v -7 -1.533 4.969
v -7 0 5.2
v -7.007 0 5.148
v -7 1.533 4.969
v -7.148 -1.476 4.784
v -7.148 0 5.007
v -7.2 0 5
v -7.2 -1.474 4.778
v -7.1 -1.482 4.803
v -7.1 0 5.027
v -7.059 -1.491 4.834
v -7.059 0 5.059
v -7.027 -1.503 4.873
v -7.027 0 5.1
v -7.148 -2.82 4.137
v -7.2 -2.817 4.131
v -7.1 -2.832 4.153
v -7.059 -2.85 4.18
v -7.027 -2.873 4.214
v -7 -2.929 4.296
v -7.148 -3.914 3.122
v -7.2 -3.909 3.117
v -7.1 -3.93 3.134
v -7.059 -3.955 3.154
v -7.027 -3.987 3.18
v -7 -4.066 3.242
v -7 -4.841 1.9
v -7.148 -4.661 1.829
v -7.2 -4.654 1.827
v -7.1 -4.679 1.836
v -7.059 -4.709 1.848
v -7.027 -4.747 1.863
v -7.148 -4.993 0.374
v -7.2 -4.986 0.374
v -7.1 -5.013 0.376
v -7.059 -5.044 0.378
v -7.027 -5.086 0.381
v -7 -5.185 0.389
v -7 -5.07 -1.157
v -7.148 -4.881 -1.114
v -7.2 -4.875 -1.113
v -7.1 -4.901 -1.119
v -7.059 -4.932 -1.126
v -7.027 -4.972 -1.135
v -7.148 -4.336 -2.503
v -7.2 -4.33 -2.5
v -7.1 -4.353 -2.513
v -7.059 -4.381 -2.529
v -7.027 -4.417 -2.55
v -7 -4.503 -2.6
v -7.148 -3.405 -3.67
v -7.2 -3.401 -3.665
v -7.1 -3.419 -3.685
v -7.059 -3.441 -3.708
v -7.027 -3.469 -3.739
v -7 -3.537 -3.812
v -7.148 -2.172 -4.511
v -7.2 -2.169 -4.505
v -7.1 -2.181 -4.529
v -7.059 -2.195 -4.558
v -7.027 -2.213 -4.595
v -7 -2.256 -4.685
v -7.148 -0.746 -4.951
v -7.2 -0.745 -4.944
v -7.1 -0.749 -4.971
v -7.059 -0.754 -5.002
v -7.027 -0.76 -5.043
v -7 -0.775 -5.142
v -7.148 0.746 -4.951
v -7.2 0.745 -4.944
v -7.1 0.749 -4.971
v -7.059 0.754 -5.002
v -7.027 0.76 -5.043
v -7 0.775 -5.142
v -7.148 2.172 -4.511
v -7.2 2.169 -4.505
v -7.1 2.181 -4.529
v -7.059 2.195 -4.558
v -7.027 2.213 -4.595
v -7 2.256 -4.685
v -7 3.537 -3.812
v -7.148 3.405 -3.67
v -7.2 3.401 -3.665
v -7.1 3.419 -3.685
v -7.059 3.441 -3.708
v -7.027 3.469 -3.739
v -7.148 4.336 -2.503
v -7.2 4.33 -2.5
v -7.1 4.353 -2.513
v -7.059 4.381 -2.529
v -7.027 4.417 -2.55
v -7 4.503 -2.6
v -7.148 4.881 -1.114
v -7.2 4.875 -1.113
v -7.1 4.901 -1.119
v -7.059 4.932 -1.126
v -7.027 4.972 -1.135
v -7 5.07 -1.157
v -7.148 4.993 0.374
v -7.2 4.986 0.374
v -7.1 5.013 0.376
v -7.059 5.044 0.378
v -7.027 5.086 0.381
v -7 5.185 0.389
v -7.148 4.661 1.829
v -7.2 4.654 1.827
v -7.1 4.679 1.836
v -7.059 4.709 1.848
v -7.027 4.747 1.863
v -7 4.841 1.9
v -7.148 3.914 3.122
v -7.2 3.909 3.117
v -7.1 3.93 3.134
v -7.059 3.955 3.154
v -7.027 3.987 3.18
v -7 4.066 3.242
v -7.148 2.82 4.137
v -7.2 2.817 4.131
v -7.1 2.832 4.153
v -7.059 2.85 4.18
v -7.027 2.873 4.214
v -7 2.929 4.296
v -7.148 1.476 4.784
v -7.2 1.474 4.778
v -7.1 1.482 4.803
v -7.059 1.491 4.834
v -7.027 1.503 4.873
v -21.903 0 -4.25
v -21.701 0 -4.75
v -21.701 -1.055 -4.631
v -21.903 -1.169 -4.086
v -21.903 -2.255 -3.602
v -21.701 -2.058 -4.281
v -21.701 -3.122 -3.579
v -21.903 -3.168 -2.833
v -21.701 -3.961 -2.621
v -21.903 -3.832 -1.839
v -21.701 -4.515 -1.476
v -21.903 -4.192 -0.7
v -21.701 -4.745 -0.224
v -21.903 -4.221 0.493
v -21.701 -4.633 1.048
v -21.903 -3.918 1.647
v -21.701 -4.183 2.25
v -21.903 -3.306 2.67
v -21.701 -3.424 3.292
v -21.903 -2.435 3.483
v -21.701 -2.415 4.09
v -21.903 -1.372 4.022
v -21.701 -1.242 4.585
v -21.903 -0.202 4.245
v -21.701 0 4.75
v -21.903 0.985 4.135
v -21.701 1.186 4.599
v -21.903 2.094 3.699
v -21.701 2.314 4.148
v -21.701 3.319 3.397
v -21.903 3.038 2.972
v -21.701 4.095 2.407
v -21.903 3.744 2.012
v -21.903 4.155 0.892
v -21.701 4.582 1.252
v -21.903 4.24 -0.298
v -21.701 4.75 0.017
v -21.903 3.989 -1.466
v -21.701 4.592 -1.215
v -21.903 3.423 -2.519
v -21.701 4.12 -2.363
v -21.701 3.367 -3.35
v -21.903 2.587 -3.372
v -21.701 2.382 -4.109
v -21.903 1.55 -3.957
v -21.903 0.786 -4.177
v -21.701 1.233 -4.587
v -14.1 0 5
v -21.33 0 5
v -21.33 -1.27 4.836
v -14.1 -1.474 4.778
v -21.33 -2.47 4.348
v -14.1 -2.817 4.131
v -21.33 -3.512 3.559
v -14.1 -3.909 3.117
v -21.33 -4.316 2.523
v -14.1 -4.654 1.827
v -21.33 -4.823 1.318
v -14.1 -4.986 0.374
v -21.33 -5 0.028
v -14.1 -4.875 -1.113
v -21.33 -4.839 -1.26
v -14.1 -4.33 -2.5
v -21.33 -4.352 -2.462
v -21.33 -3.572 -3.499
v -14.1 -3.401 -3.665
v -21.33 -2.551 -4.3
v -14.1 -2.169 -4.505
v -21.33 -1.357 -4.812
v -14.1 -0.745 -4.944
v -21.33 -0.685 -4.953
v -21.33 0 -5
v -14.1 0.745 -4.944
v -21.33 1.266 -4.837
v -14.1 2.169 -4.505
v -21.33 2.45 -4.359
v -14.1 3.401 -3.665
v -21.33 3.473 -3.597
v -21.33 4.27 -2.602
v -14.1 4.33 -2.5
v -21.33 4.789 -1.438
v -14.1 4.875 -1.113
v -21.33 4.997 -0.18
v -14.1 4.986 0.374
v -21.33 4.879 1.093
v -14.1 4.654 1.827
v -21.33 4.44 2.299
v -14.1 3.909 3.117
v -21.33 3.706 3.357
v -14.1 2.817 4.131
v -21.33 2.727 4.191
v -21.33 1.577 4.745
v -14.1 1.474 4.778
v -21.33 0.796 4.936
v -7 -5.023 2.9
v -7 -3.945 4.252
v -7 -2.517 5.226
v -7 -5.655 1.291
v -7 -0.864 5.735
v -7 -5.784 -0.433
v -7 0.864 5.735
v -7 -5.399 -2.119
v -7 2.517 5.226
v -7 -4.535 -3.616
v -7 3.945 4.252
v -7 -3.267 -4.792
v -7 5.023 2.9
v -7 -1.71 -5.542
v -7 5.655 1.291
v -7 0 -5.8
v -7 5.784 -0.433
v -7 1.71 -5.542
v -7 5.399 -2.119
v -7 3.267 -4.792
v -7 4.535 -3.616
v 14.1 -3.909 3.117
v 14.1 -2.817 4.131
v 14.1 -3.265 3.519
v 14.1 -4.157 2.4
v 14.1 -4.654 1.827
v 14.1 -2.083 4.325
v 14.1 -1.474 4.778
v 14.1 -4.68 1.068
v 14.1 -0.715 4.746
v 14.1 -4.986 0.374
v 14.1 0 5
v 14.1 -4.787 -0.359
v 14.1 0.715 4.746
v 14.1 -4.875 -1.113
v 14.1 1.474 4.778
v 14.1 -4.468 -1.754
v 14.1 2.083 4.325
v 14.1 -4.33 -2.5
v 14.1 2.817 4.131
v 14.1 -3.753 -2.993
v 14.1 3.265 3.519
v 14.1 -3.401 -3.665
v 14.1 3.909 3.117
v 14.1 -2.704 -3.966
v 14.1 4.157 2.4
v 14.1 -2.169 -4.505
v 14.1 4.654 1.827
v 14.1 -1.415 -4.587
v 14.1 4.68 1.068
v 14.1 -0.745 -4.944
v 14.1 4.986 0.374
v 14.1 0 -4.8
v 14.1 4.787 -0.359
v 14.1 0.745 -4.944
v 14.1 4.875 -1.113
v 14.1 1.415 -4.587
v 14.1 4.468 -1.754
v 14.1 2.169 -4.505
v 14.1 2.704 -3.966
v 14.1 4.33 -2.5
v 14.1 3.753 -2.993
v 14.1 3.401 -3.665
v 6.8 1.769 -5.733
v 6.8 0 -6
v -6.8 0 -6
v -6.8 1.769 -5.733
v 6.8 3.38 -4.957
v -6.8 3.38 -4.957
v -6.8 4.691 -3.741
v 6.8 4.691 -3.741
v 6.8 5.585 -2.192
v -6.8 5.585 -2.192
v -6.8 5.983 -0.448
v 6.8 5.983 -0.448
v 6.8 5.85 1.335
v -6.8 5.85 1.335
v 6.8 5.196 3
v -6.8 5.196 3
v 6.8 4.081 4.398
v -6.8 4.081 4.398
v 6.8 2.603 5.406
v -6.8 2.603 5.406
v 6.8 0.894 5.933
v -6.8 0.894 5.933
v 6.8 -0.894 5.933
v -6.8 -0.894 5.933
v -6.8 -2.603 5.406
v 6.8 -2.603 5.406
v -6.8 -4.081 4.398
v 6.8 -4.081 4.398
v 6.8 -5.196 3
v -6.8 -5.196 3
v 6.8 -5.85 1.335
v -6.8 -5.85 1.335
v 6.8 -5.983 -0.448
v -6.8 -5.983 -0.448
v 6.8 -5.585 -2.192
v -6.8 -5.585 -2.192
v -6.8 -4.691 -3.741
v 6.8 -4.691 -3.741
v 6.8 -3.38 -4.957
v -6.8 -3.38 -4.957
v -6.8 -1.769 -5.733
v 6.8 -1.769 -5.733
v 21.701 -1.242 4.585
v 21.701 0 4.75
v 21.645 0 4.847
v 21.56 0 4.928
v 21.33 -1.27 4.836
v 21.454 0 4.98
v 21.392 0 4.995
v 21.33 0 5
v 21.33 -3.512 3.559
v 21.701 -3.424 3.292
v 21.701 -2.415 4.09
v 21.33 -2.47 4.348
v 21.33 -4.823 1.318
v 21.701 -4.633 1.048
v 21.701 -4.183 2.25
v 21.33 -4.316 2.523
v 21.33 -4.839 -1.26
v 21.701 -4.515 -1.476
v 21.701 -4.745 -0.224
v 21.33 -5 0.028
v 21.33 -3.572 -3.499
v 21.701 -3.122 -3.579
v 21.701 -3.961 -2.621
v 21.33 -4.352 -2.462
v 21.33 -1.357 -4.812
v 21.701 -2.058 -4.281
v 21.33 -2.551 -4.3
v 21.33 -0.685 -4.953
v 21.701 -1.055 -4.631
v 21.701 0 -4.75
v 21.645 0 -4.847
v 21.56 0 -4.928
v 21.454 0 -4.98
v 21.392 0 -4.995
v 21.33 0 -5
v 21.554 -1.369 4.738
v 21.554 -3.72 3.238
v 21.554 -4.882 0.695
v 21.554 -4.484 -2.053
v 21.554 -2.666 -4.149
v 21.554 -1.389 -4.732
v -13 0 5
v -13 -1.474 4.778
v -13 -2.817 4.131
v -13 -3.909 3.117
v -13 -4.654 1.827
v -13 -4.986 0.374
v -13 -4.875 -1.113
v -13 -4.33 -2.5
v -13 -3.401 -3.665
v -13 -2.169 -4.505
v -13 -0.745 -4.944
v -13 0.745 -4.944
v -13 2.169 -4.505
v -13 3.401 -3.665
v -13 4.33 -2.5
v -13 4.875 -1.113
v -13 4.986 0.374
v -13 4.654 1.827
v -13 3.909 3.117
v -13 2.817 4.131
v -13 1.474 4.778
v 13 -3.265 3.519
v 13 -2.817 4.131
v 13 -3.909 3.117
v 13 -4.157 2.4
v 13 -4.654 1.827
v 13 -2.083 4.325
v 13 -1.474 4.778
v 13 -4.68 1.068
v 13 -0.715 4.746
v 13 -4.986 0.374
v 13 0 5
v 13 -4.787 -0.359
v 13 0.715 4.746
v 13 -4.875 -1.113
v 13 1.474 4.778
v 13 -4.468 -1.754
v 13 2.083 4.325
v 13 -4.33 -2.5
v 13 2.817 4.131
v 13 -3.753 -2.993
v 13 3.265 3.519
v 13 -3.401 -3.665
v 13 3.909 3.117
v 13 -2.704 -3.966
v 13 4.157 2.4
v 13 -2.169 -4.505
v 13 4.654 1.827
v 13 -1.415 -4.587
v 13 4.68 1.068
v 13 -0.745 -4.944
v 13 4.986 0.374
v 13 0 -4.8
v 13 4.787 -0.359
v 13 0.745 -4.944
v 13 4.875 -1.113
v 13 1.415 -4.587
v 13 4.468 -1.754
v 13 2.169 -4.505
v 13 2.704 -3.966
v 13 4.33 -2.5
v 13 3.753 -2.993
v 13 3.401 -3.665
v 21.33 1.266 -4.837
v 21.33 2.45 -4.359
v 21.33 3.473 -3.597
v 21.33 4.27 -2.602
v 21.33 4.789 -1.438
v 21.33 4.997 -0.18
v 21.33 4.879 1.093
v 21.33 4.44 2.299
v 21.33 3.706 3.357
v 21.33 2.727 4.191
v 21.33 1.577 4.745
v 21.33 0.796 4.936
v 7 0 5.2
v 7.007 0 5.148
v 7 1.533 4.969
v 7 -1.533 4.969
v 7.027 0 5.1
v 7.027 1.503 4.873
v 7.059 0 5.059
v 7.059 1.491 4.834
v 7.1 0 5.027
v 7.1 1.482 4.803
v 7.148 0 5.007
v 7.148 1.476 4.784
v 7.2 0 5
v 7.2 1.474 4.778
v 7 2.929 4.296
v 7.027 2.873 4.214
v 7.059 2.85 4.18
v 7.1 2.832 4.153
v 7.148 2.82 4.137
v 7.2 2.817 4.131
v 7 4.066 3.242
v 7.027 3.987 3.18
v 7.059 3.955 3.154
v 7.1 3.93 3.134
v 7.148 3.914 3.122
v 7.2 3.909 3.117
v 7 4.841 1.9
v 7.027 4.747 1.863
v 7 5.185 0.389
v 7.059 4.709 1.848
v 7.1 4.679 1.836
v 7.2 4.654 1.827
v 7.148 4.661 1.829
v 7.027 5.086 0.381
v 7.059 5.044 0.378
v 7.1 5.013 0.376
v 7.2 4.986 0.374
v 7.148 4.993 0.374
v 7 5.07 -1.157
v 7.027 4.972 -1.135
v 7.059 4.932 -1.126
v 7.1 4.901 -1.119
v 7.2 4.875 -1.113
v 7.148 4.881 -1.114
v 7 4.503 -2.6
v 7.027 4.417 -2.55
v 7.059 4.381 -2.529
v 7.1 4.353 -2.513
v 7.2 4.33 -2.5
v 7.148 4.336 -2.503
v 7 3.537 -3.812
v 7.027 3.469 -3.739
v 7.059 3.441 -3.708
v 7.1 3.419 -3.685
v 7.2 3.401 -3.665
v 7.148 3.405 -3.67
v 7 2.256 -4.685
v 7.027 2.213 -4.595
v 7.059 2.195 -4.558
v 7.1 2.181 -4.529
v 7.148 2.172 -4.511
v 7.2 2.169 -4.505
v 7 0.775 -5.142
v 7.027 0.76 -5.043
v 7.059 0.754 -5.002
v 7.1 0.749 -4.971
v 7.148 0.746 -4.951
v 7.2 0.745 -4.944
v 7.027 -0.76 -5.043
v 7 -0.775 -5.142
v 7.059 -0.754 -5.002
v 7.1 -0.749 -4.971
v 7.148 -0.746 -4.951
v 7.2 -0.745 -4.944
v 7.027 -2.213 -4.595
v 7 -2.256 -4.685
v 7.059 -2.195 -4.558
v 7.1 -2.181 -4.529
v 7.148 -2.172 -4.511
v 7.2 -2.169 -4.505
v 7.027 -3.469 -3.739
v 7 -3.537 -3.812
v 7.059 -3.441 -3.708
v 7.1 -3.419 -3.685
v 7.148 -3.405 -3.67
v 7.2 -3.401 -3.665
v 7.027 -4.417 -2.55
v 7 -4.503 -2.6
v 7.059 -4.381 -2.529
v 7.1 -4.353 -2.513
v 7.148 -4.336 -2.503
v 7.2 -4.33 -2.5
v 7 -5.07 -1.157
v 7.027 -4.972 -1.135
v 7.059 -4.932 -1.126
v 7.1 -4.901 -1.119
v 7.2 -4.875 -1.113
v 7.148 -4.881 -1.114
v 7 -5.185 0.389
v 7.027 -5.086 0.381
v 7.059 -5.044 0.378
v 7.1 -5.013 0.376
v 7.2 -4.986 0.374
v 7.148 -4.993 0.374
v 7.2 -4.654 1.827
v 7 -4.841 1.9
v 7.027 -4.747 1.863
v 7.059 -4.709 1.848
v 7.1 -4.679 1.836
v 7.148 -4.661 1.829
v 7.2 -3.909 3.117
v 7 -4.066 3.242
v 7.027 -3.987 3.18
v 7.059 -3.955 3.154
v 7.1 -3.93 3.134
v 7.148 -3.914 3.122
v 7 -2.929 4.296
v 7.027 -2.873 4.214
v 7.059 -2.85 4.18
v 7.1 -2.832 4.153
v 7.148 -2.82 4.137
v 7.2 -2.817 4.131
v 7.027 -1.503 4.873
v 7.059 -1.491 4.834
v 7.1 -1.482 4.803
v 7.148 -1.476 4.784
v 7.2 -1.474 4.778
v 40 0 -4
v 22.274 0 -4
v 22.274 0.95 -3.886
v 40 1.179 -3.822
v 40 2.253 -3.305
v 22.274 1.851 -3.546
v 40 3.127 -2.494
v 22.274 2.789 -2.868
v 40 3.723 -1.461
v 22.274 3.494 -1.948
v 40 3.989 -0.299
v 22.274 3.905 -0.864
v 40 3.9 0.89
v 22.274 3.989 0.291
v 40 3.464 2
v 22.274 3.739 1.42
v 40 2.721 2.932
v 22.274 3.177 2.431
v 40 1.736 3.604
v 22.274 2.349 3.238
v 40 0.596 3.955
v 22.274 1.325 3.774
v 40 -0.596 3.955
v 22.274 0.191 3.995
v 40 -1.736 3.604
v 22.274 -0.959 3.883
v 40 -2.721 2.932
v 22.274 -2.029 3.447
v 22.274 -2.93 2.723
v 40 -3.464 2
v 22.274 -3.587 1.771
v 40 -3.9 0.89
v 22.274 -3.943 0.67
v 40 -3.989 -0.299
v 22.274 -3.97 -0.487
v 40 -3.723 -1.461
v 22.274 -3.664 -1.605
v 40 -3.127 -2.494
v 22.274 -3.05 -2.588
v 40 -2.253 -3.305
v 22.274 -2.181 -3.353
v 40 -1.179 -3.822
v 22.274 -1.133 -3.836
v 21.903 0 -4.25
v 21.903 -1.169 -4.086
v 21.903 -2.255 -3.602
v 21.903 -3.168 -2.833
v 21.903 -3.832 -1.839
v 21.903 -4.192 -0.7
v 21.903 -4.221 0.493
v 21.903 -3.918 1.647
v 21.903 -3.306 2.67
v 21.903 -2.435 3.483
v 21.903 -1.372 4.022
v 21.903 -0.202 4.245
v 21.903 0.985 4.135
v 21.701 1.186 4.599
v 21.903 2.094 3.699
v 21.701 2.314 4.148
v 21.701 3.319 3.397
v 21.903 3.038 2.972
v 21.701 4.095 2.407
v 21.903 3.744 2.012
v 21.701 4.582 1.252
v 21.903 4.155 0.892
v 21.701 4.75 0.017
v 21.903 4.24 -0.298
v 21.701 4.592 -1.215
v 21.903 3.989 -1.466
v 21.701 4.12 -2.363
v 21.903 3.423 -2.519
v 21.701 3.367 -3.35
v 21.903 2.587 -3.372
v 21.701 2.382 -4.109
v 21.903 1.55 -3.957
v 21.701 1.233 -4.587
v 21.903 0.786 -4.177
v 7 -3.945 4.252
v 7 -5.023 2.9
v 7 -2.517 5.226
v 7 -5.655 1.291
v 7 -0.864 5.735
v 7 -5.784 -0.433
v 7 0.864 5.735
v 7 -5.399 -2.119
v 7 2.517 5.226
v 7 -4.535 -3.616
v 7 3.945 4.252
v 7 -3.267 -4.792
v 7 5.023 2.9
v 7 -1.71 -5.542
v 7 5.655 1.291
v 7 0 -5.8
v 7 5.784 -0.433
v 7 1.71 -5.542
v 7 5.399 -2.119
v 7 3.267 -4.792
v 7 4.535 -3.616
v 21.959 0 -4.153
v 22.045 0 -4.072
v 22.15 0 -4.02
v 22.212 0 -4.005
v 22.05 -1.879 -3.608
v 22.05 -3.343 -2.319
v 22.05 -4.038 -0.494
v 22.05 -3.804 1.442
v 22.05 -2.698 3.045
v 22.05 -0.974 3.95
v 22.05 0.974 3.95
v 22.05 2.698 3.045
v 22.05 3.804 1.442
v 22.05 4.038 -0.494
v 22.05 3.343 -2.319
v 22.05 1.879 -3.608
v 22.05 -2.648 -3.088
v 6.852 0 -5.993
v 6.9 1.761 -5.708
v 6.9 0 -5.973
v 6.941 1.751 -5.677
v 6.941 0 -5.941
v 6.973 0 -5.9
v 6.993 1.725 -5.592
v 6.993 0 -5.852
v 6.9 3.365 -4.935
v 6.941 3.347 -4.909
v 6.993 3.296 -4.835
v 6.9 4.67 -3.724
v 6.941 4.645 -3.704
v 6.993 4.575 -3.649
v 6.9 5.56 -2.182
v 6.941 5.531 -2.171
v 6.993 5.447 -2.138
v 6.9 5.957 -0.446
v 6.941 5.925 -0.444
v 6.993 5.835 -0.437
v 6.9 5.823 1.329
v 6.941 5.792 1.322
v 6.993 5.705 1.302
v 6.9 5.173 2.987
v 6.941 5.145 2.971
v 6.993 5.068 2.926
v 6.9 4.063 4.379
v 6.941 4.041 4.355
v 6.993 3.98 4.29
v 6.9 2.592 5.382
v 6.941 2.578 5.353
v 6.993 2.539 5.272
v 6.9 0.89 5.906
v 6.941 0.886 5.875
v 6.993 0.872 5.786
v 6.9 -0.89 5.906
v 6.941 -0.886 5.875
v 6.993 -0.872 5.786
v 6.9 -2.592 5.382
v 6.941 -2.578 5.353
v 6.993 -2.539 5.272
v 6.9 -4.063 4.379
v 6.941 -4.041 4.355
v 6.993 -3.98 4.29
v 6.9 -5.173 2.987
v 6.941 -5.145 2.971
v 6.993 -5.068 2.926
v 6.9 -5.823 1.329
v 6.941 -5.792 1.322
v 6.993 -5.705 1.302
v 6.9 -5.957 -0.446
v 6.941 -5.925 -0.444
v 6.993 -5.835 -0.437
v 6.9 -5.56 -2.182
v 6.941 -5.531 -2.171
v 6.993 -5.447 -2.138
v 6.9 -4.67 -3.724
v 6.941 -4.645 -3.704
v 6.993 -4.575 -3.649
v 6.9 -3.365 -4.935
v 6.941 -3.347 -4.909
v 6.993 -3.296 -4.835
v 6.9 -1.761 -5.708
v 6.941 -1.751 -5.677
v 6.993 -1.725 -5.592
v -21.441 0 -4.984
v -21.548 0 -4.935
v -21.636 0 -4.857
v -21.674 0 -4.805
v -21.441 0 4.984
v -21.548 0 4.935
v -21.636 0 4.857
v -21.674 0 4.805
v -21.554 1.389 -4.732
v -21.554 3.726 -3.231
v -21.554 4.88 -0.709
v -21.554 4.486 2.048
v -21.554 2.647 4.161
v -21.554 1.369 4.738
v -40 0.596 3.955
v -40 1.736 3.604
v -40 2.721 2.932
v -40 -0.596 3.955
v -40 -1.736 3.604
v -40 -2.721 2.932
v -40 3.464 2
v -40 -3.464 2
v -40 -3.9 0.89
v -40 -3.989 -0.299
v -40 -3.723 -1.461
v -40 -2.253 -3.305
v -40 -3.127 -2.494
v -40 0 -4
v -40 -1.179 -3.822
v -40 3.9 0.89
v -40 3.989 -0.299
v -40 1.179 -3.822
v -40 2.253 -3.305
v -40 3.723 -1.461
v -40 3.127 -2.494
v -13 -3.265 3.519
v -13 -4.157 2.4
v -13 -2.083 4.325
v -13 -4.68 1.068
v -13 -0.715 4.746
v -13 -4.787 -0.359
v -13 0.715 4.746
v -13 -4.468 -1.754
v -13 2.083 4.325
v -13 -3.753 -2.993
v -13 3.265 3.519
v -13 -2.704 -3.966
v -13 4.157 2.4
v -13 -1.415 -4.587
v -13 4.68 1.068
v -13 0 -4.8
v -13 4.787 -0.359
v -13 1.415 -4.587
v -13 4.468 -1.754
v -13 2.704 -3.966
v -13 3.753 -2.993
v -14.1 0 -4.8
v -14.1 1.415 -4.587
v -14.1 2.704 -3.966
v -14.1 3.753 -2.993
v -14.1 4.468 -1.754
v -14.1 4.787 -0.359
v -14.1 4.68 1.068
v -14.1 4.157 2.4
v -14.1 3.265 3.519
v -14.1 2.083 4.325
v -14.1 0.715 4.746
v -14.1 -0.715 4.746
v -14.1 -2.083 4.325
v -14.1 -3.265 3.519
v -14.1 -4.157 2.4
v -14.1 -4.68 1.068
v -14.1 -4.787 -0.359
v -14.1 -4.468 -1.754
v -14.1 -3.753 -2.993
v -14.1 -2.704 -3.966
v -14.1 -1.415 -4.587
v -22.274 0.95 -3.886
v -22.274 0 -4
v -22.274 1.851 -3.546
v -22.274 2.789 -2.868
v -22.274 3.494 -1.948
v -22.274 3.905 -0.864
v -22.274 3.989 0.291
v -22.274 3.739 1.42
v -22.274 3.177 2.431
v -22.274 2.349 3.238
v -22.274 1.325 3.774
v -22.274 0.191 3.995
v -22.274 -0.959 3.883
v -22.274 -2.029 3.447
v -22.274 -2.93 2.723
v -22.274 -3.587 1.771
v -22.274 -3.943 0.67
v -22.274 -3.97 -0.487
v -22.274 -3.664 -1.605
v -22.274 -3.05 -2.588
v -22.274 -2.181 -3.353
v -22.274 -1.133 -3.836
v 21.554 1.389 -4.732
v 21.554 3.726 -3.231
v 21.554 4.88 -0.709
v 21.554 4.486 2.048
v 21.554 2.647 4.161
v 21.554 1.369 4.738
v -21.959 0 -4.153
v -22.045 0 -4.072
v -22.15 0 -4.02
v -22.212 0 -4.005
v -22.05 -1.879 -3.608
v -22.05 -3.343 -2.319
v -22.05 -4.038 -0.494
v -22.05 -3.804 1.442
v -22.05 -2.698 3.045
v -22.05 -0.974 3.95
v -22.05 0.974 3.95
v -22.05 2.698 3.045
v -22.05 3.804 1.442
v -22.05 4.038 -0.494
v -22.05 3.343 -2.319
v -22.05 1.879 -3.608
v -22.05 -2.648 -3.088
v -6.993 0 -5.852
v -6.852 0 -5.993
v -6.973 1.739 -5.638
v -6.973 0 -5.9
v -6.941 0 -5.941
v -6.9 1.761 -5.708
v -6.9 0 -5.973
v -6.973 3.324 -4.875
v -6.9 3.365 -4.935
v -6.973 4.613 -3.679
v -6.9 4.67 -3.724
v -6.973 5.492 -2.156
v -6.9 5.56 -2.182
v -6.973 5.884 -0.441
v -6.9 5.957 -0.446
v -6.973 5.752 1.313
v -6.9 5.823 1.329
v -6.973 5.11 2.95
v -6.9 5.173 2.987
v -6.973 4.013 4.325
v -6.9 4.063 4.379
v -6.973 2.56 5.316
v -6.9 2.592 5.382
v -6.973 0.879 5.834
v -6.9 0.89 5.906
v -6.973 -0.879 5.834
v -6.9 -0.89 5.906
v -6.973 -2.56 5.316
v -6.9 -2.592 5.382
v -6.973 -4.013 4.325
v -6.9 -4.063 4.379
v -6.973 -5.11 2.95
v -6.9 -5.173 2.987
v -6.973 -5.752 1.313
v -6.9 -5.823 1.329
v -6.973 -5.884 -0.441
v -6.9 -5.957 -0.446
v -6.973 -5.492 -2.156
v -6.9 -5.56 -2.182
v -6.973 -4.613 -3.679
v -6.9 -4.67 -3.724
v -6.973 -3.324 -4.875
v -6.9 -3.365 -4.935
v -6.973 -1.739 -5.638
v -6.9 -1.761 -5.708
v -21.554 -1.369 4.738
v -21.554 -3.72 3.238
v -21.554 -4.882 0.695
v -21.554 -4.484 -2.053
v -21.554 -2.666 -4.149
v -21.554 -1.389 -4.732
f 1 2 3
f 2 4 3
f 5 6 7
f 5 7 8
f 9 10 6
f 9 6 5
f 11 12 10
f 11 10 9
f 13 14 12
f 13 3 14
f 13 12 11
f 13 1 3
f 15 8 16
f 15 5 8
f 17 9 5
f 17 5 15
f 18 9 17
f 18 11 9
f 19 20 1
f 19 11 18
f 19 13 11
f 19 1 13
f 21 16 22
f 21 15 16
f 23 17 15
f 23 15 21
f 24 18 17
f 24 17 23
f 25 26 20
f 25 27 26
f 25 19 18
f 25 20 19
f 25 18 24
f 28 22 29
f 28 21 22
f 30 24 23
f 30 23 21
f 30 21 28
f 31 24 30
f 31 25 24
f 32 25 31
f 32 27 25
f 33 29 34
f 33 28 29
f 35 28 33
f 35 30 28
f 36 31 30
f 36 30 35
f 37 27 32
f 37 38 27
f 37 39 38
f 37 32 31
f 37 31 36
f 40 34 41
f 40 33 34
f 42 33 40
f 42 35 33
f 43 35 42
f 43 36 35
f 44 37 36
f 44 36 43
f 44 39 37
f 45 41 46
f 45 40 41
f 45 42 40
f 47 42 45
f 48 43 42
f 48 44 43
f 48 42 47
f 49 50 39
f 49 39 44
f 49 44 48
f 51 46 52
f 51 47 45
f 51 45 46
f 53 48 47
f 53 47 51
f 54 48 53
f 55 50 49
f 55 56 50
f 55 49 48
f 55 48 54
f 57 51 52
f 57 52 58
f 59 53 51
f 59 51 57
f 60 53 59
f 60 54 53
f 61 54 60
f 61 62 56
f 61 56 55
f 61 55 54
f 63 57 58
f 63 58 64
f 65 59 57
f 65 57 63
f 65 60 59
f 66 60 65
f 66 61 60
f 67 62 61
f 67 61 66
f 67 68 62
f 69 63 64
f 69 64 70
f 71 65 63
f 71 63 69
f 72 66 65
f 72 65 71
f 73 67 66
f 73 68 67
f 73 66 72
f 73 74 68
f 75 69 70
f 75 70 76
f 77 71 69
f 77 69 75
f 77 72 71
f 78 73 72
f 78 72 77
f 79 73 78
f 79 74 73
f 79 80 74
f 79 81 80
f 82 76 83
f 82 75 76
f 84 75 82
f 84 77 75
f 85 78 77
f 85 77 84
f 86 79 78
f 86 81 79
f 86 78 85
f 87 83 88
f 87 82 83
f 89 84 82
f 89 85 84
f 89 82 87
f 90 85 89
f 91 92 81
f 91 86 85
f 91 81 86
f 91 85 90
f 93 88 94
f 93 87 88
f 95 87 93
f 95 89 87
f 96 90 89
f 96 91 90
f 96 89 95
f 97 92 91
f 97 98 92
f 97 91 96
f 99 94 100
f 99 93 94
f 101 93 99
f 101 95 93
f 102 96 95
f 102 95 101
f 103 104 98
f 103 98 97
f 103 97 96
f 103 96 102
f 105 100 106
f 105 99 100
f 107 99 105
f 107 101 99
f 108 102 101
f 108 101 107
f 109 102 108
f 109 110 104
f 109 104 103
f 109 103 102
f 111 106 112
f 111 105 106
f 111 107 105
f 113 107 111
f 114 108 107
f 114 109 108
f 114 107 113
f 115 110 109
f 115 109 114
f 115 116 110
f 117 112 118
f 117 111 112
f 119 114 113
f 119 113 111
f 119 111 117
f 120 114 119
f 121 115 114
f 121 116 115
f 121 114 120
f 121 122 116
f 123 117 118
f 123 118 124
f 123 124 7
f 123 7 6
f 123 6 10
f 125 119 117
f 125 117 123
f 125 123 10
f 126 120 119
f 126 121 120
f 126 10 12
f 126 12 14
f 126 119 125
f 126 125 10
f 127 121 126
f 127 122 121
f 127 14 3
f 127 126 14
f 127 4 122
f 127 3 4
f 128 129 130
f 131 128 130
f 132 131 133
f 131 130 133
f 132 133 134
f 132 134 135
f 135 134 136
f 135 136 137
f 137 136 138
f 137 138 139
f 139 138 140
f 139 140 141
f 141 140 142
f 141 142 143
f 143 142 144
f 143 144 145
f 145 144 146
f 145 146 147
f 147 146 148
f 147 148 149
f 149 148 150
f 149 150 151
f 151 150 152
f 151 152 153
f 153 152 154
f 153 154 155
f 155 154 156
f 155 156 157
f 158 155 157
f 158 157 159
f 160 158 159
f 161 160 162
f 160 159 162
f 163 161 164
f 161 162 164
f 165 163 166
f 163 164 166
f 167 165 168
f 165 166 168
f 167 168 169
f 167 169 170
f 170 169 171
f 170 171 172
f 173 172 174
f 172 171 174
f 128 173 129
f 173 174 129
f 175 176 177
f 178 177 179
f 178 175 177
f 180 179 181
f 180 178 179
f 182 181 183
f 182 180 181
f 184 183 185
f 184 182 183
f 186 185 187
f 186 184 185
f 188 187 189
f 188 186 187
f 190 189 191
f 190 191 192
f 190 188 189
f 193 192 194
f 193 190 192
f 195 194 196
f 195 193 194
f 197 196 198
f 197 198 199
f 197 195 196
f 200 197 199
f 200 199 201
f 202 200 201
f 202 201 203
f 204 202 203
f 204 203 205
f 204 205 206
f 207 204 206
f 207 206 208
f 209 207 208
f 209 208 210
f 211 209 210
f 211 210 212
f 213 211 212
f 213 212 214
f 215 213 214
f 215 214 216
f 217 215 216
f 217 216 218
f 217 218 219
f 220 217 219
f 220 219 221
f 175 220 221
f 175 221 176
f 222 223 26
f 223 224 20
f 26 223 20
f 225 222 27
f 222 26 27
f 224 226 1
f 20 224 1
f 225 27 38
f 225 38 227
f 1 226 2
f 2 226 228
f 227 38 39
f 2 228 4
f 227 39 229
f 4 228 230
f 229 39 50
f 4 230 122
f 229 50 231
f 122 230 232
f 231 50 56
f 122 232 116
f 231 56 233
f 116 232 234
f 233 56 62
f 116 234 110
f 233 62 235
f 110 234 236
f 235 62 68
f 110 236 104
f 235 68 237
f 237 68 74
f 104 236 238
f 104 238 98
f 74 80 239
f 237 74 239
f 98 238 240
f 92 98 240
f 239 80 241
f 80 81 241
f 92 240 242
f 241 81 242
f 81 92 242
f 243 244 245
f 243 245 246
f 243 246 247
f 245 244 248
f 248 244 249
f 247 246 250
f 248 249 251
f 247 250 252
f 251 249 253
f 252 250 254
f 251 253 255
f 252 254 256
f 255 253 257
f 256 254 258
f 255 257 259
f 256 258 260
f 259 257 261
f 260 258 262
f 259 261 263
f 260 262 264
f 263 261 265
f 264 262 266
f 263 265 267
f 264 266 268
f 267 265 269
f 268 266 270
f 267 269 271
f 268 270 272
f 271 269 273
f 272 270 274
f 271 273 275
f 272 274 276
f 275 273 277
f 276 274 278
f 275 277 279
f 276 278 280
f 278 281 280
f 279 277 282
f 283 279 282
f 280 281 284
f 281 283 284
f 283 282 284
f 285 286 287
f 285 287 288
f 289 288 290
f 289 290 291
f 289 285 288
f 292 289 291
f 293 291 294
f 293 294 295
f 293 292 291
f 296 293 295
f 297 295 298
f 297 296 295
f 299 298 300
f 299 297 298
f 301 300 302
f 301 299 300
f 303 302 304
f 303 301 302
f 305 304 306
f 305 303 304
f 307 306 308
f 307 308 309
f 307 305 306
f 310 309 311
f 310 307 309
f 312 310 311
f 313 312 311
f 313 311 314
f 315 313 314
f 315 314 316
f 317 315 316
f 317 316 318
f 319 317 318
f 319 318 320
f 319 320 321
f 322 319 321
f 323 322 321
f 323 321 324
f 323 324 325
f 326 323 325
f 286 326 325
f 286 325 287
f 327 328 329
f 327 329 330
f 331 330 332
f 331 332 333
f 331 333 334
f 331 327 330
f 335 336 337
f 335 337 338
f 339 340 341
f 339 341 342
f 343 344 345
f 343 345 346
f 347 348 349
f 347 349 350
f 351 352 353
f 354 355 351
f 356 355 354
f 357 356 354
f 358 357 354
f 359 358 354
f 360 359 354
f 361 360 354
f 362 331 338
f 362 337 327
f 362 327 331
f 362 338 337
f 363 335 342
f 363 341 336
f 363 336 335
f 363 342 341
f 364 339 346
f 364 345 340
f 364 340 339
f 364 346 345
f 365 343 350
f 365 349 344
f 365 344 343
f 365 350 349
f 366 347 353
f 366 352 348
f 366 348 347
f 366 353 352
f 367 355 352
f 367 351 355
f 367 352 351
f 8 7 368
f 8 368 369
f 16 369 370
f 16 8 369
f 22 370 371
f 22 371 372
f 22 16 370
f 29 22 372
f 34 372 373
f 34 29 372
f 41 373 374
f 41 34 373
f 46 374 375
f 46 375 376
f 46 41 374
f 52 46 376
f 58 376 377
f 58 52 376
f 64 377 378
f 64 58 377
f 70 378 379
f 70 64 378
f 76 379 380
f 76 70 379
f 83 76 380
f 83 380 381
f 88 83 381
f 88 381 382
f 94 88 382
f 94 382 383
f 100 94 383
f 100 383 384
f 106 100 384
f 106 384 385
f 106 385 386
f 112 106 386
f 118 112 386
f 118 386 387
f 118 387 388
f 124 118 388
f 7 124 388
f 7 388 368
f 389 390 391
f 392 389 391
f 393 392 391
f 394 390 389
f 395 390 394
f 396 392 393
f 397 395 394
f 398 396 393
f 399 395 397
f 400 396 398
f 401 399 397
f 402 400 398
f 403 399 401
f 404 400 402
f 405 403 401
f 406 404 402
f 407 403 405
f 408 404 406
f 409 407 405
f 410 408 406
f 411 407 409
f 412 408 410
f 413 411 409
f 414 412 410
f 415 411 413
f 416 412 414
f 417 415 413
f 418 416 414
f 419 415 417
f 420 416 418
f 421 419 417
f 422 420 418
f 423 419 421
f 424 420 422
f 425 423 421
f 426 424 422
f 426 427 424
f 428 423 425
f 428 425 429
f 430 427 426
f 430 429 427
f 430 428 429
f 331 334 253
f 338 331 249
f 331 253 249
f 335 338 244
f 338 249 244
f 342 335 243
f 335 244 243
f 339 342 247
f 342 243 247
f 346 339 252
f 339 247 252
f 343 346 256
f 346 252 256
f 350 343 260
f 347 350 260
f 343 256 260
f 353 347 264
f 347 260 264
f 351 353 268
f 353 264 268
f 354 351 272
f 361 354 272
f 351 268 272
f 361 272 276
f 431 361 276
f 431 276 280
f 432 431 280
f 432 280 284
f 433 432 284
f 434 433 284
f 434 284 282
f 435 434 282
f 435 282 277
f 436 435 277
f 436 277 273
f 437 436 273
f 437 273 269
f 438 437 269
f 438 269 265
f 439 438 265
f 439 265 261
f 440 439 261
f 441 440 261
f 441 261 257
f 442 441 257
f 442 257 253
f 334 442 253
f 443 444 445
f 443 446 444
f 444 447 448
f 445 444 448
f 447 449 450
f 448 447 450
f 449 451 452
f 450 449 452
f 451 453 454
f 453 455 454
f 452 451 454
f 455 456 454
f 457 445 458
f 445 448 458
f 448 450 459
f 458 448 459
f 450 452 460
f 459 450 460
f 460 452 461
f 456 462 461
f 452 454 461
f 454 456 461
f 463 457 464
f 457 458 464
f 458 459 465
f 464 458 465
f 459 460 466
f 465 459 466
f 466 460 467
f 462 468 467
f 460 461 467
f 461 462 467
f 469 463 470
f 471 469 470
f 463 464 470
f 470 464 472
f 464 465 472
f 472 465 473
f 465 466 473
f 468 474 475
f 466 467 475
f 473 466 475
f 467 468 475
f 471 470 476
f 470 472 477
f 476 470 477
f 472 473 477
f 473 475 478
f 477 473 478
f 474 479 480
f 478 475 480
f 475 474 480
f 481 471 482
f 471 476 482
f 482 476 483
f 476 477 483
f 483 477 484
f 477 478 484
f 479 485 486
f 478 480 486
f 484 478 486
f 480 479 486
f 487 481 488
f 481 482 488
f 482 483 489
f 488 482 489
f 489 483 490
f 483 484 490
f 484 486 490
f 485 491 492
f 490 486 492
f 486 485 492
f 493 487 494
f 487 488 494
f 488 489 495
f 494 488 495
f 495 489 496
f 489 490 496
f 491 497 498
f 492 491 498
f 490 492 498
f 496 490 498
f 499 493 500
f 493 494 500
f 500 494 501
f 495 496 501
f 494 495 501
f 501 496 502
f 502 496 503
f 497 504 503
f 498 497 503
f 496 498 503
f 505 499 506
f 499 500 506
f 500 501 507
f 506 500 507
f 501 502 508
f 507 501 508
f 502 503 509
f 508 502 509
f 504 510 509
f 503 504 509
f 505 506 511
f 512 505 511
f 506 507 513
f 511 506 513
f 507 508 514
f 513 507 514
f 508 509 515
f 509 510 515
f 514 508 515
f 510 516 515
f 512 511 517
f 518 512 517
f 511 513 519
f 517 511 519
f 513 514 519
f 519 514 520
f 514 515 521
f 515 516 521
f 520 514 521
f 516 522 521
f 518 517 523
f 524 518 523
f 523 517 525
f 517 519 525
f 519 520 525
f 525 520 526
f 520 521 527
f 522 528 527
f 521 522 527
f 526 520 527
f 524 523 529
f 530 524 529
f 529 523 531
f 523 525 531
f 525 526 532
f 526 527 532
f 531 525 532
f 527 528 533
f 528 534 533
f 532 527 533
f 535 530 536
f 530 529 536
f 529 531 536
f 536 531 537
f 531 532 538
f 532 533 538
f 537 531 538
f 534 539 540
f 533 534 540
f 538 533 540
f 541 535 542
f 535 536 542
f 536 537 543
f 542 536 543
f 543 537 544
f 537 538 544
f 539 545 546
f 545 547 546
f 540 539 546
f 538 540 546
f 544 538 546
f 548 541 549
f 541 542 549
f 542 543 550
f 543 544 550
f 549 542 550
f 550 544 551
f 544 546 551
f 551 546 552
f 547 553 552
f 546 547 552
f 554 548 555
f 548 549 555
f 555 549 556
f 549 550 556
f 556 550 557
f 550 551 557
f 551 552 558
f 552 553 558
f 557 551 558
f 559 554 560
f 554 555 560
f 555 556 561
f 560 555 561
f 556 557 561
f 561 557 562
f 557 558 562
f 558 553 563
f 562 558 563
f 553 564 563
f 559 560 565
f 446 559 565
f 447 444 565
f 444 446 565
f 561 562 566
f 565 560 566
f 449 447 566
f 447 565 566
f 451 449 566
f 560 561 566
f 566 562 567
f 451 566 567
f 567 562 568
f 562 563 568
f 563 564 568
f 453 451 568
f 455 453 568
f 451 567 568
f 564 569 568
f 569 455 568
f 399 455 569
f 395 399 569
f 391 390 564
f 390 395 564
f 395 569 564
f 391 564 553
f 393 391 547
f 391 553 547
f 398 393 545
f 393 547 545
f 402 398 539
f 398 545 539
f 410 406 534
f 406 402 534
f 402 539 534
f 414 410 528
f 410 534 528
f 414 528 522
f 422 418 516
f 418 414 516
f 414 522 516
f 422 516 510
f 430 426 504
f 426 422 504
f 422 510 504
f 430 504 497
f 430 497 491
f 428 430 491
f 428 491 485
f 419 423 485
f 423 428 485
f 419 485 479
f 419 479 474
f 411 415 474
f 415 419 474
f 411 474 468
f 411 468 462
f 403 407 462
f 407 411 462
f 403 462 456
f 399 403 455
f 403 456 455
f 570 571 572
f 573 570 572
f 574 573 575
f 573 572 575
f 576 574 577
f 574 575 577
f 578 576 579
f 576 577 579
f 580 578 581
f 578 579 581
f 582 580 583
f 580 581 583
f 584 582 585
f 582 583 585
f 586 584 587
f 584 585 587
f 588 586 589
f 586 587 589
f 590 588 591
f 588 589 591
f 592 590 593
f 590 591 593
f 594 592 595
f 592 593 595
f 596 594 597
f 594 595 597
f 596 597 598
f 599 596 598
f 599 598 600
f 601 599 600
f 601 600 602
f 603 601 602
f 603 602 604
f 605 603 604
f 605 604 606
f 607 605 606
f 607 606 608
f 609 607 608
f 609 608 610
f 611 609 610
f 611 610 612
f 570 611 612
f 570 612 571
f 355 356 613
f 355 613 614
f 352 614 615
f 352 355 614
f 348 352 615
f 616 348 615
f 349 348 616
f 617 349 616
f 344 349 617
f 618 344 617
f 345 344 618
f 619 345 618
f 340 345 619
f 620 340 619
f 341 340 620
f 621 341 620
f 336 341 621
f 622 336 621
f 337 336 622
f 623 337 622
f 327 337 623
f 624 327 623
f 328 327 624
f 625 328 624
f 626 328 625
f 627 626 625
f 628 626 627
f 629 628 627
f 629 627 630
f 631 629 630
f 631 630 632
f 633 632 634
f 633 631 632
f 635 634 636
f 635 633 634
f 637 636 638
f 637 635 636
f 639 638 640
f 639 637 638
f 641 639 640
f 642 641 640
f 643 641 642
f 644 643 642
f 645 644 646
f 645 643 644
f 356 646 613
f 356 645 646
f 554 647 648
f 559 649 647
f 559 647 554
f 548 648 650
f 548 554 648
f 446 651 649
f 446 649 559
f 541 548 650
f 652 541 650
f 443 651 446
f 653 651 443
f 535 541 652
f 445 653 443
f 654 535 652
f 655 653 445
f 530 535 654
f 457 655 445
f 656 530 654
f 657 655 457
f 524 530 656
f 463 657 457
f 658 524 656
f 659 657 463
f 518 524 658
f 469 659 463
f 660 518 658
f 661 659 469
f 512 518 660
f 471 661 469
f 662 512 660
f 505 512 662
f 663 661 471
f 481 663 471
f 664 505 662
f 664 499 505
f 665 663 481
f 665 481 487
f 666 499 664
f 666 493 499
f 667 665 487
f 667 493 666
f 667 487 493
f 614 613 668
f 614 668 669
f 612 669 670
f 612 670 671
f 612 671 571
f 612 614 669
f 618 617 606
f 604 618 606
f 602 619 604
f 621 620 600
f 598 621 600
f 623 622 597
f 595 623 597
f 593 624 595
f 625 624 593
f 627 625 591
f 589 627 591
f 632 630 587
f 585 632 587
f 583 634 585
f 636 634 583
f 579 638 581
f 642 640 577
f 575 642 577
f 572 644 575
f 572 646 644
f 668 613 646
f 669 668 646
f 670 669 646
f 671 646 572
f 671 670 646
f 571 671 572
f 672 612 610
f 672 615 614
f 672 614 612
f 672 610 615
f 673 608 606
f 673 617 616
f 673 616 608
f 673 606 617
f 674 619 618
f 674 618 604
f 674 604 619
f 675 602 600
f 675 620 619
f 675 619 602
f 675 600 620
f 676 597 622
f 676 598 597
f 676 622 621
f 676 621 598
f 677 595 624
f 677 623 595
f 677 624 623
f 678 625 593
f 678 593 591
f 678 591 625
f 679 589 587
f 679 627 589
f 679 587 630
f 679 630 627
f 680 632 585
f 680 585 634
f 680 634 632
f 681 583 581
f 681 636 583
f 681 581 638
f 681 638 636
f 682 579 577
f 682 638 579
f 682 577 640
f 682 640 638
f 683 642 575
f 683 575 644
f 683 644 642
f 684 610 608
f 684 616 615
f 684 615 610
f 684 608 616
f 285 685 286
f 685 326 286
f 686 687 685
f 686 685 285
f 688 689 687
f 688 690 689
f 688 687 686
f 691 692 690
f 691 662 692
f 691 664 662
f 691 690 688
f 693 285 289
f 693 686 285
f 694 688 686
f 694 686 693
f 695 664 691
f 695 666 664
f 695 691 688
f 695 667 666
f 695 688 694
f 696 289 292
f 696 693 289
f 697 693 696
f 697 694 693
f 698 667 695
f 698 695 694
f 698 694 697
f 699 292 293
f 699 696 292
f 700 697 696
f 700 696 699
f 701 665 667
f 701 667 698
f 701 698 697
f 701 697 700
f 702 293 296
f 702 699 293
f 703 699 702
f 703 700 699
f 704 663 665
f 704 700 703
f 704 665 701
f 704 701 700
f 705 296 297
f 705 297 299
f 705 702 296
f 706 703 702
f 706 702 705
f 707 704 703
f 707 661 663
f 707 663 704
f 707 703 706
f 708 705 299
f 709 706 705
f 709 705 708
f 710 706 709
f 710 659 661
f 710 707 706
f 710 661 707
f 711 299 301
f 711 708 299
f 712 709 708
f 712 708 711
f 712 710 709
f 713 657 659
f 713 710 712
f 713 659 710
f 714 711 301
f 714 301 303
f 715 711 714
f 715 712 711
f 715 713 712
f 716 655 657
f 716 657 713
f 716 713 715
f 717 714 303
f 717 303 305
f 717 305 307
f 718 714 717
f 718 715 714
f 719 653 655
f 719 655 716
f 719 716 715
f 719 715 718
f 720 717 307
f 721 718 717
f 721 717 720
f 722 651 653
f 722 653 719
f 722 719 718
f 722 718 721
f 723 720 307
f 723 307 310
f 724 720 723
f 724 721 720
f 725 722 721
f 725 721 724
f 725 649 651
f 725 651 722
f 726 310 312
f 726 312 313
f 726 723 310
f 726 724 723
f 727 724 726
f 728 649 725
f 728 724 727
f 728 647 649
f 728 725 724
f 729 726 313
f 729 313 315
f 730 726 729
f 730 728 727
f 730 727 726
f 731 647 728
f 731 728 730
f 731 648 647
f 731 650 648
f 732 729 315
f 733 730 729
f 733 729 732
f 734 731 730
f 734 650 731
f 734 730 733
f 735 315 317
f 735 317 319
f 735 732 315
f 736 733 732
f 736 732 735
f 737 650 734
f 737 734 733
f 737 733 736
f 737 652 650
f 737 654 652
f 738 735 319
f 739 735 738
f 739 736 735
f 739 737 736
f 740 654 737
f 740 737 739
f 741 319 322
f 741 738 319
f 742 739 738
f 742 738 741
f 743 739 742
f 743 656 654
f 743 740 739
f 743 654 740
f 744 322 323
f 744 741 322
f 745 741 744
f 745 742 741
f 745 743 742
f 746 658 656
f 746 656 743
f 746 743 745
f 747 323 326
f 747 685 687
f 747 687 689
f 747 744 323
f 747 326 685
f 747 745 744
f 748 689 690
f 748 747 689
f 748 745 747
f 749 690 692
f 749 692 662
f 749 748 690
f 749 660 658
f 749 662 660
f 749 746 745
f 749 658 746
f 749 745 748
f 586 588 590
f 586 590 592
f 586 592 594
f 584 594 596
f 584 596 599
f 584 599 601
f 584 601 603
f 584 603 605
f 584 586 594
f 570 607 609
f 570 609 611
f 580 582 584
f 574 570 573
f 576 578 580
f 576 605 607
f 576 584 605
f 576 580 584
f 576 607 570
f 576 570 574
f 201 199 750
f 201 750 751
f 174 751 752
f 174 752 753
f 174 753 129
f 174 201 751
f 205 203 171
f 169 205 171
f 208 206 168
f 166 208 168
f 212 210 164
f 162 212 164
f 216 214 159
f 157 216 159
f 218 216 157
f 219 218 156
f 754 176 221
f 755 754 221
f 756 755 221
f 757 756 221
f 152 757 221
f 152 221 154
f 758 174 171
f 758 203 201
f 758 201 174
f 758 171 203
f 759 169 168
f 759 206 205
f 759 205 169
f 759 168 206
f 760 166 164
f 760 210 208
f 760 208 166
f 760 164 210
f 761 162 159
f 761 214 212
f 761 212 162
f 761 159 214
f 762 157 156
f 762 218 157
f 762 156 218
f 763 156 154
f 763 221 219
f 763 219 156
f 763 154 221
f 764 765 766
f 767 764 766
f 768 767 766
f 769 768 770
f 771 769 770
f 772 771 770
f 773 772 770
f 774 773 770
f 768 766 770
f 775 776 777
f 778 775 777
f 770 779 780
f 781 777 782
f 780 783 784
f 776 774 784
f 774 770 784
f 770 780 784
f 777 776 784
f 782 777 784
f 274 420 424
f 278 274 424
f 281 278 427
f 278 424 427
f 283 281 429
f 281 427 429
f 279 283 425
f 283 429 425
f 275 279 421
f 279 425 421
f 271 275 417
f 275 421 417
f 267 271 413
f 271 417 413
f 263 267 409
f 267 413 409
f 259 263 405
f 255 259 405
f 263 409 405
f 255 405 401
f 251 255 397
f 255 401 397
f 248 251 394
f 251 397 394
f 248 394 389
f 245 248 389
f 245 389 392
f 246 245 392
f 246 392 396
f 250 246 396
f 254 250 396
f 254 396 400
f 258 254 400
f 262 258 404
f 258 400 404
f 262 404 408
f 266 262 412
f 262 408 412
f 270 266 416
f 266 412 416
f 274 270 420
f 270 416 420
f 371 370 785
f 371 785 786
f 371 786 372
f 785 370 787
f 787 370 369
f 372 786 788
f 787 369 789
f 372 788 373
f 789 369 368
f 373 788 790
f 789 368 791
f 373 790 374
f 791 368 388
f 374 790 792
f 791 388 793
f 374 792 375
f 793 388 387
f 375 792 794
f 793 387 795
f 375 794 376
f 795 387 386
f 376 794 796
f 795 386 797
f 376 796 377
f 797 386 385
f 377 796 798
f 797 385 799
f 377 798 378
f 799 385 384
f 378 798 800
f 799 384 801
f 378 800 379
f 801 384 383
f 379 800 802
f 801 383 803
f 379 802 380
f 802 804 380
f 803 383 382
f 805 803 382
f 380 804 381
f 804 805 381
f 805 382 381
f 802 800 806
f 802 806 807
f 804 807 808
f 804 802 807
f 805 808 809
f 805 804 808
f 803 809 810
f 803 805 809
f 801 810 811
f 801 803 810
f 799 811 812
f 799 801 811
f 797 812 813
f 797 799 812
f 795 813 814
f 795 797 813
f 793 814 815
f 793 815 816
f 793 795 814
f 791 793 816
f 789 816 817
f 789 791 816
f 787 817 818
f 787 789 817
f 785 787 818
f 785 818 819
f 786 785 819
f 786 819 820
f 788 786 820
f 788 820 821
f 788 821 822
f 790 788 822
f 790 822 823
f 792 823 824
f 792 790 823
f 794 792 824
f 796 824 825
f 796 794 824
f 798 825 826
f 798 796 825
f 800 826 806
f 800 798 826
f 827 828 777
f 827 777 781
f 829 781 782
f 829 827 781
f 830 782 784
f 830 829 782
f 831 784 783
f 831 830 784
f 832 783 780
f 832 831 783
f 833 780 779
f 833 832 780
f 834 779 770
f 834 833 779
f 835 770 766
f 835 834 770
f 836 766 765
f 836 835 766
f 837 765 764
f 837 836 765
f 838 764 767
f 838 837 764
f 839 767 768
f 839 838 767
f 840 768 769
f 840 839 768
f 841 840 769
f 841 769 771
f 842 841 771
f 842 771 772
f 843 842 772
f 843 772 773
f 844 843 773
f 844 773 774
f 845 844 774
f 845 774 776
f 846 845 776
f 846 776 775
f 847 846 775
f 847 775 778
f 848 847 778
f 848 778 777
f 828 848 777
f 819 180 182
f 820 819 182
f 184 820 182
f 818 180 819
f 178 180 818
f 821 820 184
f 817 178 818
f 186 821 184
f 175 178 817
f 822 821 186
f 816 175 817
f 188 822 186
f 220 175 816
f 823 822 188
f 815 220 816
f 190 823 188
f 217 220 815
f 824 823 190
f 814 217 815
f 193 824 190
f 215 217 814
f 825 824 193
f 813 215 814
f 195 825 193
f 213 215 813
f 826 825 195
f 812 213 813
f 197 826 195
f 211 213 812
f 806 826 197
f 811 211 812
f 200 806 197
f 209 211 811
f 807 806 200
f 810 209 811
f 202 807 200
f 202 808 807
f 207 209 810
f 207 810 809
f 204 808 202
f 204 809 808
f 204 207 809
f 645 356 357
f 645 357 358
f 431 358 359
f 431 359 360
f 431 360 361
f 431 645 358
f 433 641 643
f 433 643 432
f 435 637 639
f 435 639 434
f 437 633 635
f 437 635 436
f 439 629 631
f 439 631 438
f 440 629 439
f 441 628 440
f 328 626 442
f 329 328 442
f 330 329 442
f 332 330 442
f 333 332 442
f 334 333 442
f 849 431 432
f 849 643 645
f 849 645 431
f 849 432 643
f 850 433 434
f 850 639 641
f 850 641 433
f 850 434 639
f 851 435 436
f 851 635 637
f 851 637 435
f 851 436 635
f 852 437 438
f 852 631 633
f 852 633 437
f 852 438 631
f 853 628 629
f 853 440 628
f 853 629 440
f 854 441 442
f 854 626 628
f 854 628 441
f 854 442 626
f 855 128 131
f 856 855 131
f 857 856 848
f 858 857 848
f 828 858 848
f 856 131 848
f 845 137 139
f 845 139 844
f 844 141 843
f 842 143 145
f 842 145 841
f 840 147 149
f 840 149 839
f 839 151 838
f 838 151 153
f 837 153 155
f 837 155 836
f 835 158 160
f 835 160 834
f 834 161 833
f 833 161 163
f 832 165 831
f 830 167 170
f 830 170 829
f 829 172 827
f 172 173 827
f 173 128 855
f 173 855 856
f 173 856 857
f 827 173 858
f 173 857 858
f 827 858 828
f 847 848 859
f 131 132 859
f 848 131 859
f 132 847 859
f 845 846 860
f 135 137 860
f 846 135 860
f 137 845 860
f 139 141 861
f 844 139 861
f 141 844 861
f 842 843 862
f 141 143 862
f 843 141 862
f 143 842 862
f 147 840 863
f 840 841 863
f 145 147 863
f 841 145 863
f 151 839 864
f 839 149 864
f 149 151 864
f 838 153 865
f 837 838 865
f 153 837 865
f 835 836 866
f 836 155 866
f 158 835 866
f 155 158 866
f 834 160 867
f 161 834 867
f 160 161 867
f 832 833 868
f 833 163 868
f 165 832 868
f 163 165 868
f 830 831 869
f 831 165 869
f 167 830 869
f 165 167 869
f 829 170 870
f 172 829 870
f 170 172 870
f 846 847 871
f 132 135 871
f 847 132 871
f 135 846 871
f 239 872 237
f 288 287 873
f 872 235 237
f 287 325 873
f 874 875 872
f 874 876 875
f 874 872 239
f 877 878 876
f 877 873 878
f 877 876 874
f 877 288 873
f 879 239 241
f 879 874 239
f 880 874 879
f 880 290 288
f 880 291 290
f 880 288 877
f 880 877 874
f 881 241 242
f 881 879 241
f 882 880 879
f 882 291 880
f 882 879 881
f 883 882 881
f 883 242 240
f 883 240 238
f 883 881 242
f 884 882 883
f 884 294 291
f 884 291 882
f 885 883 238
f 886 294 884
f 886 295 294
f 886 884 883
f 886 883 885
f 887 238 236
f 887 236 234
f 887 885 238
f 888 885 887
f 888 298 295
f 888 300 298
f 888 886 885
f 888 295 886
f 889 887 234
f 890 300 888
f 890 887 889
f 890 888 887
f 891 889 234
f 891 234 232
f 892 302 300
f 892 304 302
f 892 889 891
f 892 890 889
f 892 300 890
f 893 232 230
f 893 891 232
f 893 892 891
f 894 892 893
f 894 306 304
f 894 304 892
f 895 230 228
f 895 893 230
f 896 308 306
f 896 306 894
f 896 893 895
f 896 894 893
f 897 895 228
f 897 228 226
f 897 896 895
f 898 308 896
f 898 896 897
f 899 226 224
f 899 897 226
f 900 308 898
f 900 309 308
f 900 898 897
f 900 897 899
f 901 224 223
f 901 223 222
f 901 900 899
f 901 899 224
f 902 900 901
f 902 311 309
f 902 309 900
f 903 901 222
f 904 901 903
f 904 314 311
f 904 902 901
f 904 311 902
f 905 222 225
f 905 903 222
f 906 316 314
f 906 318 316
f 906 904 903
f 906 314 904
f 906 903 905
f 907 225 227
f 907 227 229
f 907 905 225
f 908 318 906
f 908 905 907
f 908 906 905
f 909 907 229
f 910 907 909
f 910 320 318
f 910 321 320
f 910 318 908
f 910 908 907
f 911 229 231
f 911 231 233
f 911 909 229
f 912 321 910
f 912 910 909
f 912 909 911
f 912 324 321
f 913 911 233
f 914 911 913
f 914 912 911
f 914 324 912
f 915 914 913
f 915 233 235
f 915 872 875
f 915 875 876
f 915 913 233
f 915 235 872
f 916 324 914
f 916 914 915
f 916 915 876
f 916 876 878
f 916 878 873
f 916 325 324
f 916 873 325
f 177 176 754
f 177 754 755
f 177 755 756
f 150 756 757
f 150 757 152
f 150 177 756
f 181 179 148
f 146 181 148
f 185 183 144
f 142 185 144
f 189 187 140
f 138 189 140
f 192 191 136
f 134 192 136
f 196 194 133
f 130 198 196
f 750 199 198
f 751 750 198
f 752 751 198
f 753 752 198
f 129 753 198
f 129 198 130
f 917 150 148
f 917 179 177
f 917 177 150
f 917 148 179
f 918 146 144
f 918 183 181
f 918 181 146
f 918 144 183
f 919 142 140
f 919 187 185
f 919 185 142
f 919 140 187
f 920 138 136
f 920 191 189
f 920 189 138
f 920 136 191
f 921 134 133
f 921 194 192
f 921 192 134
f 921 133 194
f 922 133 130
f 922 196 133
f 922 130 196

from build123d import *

# Parameters (mm, degrees)
SKETCH1_R            = 4
BOSS_EXTRUDE1_DEPTH  = 40
SKETCH2_R            = 6
BOSS_EXTRUDE2_DEPTH  = 7
SKETCH3_R            = 5
BOSS_EXTRUDE3_DEPTH  = 21.6
FILLET1_R            = 0.2
SKETCH4_R            = 8.07769614
SKETCH4_R_2          = 4.8
CUT_EXTRUDE1_DEPTH   = 1.1
FILLET3_R            = 0.4
FILLET1_OF_MIRROR1_R = 0.2
FILLET3_OF_MIRROR1_R = 0.4


with BuildPart() as part:
    # Sketch1 → Boss-Extrude1 (new body)
    with BuildSketch(Plane(origin=(0, 0, 0), x_dir=(0, 0, -1), z_dir=(1, 0, 0))):
        Circle(SKETCH1_R)
    boss_extrude1 = extrude(amount=BOSS_EXTRUDE1_DEPTH)

    # Sketch2 → Boss-Extrude2 (add)
    with BuildSketch(Plane(origin=(0, 0, 0), x_dir=(0, 0, -1), z_dir=(1, 0, 0))):
        Circle(SKETCH2_R)
    boss_extrude2 = extrude(amount=BOSS_EXTRUDE2_DEPTH)

    # Sketch3 → Boss-Extrude3 (add)
    with BuildSketch(Plane(origin=(0, 0, 0), x_dir=(0, 0, -1), z_dir=(1, 0, 0))):
        with Locations(Location((0, 0, 0), (0, 0, 180))):
            Circle(SKETCH3_R)
    boss_extrude3 = extrude(amount=BOSS_EXTRUDE3_DEPTH)

    # Fillet1
    fillet1_edges = [part.edges().sort_by_distance(p)[0] for p in [
        (7, 0, -5),
        (7, 0, 6),
    ]]
    fillet(fillet1_edges, radius=FILLET1_R)

    # Sketch4 → Cut-Extrude1 (cut)
    with BuildSketch(Plane(origin=(13, 0, 0), x_dir=(0, 0, -1), z_dir=(1, 0, 0))):
        Circle(SKETCH4_R)
        Circle(SKETCH4_R_2, mode=Mode.SUBTRACT)
    cut_extrude1 = extrude(amount=CUT_EXTRUDE1_DEPTH, mode=Mode.SUBTRACT)

    # Sketch5 → Revolve1 (revolve)
    with BuildSketch(Plane.XY, mode=Mode.PRIVATE) as revolve1_sk:
        Polygon((21.6, 5), (21.6, 4), (22.004026226, 4), align=None)
    revolve1 = revolve(revolve1_sk.sketch.rotate(Axis((21.6, 0, 0), (-1, 0, 0)), 90), axis=Axis((21.6, 0, 0), (-1, 0, 0)))

    # Fillet3
    fillet3_edges = [part.edges().sort_by_distance(p)[0] for p in [
        (21.6, 5, 0),
        (22.004026226, 0, 4),
    ]]
    fillet(fillet3_edges, radius=FILLET3_R)

    # Mirror1: Boss-Extrude1, Boss-Extrude2, Boss-Extrude3, Cut-Extrude1, Revolve1 across plane
    add(boss_extrude1.mirror(Plane(origin=(0, 0, 0), x_dir=(0, 0, 1), z_dir=(1, 0, 0))))
    add(boss_extrude2.mirror(Plane(origin=(0, 0, 0), x_dir=(0, 0, 1), z_dir=(1, 0, 0))))
    add(boss_extrude3.mirror(Plane(origin=(0, 0, 0), x_dir=(0, 0, 1), z_dir=(1, 0, 0))))
    add(cut_extrude1.mirror(Plane(origin=(0, 0, 0), x_dir=(0, 0, 1), z_dir=(1, 0, 0))), mode=Mode.SUBTRACT)
    add(revolve1.mirror(Plane(origin=(0, 0, 0), x_dir=(0, 0, 1), z_dir=(1, 0, 0))))

    # Fillet1 of Mirror1
    fillet1_of_mirror1_edges = [part.edges().sort_by_distance(p)[0] for p in [
        (-7, 0, -5),
        (-7, 0, 6),
    ]]
    fillet(fillet1_of_mirror1_edges, radius=FILLET1_OF_MIRROR1_R)

    # Fillet3 of Mirror1
    fillet3_of_mirror1_edges = [part.edges().sort_by_distance(p)[0] for p in [
        (-21.6, 5, 0),
        (-22.004026226, 0, 4),
    ]]
    fillet(fillet3_of_mirror1_edges, radius=FILLET3_OF_MIRROR1_R)


solid = part.part
